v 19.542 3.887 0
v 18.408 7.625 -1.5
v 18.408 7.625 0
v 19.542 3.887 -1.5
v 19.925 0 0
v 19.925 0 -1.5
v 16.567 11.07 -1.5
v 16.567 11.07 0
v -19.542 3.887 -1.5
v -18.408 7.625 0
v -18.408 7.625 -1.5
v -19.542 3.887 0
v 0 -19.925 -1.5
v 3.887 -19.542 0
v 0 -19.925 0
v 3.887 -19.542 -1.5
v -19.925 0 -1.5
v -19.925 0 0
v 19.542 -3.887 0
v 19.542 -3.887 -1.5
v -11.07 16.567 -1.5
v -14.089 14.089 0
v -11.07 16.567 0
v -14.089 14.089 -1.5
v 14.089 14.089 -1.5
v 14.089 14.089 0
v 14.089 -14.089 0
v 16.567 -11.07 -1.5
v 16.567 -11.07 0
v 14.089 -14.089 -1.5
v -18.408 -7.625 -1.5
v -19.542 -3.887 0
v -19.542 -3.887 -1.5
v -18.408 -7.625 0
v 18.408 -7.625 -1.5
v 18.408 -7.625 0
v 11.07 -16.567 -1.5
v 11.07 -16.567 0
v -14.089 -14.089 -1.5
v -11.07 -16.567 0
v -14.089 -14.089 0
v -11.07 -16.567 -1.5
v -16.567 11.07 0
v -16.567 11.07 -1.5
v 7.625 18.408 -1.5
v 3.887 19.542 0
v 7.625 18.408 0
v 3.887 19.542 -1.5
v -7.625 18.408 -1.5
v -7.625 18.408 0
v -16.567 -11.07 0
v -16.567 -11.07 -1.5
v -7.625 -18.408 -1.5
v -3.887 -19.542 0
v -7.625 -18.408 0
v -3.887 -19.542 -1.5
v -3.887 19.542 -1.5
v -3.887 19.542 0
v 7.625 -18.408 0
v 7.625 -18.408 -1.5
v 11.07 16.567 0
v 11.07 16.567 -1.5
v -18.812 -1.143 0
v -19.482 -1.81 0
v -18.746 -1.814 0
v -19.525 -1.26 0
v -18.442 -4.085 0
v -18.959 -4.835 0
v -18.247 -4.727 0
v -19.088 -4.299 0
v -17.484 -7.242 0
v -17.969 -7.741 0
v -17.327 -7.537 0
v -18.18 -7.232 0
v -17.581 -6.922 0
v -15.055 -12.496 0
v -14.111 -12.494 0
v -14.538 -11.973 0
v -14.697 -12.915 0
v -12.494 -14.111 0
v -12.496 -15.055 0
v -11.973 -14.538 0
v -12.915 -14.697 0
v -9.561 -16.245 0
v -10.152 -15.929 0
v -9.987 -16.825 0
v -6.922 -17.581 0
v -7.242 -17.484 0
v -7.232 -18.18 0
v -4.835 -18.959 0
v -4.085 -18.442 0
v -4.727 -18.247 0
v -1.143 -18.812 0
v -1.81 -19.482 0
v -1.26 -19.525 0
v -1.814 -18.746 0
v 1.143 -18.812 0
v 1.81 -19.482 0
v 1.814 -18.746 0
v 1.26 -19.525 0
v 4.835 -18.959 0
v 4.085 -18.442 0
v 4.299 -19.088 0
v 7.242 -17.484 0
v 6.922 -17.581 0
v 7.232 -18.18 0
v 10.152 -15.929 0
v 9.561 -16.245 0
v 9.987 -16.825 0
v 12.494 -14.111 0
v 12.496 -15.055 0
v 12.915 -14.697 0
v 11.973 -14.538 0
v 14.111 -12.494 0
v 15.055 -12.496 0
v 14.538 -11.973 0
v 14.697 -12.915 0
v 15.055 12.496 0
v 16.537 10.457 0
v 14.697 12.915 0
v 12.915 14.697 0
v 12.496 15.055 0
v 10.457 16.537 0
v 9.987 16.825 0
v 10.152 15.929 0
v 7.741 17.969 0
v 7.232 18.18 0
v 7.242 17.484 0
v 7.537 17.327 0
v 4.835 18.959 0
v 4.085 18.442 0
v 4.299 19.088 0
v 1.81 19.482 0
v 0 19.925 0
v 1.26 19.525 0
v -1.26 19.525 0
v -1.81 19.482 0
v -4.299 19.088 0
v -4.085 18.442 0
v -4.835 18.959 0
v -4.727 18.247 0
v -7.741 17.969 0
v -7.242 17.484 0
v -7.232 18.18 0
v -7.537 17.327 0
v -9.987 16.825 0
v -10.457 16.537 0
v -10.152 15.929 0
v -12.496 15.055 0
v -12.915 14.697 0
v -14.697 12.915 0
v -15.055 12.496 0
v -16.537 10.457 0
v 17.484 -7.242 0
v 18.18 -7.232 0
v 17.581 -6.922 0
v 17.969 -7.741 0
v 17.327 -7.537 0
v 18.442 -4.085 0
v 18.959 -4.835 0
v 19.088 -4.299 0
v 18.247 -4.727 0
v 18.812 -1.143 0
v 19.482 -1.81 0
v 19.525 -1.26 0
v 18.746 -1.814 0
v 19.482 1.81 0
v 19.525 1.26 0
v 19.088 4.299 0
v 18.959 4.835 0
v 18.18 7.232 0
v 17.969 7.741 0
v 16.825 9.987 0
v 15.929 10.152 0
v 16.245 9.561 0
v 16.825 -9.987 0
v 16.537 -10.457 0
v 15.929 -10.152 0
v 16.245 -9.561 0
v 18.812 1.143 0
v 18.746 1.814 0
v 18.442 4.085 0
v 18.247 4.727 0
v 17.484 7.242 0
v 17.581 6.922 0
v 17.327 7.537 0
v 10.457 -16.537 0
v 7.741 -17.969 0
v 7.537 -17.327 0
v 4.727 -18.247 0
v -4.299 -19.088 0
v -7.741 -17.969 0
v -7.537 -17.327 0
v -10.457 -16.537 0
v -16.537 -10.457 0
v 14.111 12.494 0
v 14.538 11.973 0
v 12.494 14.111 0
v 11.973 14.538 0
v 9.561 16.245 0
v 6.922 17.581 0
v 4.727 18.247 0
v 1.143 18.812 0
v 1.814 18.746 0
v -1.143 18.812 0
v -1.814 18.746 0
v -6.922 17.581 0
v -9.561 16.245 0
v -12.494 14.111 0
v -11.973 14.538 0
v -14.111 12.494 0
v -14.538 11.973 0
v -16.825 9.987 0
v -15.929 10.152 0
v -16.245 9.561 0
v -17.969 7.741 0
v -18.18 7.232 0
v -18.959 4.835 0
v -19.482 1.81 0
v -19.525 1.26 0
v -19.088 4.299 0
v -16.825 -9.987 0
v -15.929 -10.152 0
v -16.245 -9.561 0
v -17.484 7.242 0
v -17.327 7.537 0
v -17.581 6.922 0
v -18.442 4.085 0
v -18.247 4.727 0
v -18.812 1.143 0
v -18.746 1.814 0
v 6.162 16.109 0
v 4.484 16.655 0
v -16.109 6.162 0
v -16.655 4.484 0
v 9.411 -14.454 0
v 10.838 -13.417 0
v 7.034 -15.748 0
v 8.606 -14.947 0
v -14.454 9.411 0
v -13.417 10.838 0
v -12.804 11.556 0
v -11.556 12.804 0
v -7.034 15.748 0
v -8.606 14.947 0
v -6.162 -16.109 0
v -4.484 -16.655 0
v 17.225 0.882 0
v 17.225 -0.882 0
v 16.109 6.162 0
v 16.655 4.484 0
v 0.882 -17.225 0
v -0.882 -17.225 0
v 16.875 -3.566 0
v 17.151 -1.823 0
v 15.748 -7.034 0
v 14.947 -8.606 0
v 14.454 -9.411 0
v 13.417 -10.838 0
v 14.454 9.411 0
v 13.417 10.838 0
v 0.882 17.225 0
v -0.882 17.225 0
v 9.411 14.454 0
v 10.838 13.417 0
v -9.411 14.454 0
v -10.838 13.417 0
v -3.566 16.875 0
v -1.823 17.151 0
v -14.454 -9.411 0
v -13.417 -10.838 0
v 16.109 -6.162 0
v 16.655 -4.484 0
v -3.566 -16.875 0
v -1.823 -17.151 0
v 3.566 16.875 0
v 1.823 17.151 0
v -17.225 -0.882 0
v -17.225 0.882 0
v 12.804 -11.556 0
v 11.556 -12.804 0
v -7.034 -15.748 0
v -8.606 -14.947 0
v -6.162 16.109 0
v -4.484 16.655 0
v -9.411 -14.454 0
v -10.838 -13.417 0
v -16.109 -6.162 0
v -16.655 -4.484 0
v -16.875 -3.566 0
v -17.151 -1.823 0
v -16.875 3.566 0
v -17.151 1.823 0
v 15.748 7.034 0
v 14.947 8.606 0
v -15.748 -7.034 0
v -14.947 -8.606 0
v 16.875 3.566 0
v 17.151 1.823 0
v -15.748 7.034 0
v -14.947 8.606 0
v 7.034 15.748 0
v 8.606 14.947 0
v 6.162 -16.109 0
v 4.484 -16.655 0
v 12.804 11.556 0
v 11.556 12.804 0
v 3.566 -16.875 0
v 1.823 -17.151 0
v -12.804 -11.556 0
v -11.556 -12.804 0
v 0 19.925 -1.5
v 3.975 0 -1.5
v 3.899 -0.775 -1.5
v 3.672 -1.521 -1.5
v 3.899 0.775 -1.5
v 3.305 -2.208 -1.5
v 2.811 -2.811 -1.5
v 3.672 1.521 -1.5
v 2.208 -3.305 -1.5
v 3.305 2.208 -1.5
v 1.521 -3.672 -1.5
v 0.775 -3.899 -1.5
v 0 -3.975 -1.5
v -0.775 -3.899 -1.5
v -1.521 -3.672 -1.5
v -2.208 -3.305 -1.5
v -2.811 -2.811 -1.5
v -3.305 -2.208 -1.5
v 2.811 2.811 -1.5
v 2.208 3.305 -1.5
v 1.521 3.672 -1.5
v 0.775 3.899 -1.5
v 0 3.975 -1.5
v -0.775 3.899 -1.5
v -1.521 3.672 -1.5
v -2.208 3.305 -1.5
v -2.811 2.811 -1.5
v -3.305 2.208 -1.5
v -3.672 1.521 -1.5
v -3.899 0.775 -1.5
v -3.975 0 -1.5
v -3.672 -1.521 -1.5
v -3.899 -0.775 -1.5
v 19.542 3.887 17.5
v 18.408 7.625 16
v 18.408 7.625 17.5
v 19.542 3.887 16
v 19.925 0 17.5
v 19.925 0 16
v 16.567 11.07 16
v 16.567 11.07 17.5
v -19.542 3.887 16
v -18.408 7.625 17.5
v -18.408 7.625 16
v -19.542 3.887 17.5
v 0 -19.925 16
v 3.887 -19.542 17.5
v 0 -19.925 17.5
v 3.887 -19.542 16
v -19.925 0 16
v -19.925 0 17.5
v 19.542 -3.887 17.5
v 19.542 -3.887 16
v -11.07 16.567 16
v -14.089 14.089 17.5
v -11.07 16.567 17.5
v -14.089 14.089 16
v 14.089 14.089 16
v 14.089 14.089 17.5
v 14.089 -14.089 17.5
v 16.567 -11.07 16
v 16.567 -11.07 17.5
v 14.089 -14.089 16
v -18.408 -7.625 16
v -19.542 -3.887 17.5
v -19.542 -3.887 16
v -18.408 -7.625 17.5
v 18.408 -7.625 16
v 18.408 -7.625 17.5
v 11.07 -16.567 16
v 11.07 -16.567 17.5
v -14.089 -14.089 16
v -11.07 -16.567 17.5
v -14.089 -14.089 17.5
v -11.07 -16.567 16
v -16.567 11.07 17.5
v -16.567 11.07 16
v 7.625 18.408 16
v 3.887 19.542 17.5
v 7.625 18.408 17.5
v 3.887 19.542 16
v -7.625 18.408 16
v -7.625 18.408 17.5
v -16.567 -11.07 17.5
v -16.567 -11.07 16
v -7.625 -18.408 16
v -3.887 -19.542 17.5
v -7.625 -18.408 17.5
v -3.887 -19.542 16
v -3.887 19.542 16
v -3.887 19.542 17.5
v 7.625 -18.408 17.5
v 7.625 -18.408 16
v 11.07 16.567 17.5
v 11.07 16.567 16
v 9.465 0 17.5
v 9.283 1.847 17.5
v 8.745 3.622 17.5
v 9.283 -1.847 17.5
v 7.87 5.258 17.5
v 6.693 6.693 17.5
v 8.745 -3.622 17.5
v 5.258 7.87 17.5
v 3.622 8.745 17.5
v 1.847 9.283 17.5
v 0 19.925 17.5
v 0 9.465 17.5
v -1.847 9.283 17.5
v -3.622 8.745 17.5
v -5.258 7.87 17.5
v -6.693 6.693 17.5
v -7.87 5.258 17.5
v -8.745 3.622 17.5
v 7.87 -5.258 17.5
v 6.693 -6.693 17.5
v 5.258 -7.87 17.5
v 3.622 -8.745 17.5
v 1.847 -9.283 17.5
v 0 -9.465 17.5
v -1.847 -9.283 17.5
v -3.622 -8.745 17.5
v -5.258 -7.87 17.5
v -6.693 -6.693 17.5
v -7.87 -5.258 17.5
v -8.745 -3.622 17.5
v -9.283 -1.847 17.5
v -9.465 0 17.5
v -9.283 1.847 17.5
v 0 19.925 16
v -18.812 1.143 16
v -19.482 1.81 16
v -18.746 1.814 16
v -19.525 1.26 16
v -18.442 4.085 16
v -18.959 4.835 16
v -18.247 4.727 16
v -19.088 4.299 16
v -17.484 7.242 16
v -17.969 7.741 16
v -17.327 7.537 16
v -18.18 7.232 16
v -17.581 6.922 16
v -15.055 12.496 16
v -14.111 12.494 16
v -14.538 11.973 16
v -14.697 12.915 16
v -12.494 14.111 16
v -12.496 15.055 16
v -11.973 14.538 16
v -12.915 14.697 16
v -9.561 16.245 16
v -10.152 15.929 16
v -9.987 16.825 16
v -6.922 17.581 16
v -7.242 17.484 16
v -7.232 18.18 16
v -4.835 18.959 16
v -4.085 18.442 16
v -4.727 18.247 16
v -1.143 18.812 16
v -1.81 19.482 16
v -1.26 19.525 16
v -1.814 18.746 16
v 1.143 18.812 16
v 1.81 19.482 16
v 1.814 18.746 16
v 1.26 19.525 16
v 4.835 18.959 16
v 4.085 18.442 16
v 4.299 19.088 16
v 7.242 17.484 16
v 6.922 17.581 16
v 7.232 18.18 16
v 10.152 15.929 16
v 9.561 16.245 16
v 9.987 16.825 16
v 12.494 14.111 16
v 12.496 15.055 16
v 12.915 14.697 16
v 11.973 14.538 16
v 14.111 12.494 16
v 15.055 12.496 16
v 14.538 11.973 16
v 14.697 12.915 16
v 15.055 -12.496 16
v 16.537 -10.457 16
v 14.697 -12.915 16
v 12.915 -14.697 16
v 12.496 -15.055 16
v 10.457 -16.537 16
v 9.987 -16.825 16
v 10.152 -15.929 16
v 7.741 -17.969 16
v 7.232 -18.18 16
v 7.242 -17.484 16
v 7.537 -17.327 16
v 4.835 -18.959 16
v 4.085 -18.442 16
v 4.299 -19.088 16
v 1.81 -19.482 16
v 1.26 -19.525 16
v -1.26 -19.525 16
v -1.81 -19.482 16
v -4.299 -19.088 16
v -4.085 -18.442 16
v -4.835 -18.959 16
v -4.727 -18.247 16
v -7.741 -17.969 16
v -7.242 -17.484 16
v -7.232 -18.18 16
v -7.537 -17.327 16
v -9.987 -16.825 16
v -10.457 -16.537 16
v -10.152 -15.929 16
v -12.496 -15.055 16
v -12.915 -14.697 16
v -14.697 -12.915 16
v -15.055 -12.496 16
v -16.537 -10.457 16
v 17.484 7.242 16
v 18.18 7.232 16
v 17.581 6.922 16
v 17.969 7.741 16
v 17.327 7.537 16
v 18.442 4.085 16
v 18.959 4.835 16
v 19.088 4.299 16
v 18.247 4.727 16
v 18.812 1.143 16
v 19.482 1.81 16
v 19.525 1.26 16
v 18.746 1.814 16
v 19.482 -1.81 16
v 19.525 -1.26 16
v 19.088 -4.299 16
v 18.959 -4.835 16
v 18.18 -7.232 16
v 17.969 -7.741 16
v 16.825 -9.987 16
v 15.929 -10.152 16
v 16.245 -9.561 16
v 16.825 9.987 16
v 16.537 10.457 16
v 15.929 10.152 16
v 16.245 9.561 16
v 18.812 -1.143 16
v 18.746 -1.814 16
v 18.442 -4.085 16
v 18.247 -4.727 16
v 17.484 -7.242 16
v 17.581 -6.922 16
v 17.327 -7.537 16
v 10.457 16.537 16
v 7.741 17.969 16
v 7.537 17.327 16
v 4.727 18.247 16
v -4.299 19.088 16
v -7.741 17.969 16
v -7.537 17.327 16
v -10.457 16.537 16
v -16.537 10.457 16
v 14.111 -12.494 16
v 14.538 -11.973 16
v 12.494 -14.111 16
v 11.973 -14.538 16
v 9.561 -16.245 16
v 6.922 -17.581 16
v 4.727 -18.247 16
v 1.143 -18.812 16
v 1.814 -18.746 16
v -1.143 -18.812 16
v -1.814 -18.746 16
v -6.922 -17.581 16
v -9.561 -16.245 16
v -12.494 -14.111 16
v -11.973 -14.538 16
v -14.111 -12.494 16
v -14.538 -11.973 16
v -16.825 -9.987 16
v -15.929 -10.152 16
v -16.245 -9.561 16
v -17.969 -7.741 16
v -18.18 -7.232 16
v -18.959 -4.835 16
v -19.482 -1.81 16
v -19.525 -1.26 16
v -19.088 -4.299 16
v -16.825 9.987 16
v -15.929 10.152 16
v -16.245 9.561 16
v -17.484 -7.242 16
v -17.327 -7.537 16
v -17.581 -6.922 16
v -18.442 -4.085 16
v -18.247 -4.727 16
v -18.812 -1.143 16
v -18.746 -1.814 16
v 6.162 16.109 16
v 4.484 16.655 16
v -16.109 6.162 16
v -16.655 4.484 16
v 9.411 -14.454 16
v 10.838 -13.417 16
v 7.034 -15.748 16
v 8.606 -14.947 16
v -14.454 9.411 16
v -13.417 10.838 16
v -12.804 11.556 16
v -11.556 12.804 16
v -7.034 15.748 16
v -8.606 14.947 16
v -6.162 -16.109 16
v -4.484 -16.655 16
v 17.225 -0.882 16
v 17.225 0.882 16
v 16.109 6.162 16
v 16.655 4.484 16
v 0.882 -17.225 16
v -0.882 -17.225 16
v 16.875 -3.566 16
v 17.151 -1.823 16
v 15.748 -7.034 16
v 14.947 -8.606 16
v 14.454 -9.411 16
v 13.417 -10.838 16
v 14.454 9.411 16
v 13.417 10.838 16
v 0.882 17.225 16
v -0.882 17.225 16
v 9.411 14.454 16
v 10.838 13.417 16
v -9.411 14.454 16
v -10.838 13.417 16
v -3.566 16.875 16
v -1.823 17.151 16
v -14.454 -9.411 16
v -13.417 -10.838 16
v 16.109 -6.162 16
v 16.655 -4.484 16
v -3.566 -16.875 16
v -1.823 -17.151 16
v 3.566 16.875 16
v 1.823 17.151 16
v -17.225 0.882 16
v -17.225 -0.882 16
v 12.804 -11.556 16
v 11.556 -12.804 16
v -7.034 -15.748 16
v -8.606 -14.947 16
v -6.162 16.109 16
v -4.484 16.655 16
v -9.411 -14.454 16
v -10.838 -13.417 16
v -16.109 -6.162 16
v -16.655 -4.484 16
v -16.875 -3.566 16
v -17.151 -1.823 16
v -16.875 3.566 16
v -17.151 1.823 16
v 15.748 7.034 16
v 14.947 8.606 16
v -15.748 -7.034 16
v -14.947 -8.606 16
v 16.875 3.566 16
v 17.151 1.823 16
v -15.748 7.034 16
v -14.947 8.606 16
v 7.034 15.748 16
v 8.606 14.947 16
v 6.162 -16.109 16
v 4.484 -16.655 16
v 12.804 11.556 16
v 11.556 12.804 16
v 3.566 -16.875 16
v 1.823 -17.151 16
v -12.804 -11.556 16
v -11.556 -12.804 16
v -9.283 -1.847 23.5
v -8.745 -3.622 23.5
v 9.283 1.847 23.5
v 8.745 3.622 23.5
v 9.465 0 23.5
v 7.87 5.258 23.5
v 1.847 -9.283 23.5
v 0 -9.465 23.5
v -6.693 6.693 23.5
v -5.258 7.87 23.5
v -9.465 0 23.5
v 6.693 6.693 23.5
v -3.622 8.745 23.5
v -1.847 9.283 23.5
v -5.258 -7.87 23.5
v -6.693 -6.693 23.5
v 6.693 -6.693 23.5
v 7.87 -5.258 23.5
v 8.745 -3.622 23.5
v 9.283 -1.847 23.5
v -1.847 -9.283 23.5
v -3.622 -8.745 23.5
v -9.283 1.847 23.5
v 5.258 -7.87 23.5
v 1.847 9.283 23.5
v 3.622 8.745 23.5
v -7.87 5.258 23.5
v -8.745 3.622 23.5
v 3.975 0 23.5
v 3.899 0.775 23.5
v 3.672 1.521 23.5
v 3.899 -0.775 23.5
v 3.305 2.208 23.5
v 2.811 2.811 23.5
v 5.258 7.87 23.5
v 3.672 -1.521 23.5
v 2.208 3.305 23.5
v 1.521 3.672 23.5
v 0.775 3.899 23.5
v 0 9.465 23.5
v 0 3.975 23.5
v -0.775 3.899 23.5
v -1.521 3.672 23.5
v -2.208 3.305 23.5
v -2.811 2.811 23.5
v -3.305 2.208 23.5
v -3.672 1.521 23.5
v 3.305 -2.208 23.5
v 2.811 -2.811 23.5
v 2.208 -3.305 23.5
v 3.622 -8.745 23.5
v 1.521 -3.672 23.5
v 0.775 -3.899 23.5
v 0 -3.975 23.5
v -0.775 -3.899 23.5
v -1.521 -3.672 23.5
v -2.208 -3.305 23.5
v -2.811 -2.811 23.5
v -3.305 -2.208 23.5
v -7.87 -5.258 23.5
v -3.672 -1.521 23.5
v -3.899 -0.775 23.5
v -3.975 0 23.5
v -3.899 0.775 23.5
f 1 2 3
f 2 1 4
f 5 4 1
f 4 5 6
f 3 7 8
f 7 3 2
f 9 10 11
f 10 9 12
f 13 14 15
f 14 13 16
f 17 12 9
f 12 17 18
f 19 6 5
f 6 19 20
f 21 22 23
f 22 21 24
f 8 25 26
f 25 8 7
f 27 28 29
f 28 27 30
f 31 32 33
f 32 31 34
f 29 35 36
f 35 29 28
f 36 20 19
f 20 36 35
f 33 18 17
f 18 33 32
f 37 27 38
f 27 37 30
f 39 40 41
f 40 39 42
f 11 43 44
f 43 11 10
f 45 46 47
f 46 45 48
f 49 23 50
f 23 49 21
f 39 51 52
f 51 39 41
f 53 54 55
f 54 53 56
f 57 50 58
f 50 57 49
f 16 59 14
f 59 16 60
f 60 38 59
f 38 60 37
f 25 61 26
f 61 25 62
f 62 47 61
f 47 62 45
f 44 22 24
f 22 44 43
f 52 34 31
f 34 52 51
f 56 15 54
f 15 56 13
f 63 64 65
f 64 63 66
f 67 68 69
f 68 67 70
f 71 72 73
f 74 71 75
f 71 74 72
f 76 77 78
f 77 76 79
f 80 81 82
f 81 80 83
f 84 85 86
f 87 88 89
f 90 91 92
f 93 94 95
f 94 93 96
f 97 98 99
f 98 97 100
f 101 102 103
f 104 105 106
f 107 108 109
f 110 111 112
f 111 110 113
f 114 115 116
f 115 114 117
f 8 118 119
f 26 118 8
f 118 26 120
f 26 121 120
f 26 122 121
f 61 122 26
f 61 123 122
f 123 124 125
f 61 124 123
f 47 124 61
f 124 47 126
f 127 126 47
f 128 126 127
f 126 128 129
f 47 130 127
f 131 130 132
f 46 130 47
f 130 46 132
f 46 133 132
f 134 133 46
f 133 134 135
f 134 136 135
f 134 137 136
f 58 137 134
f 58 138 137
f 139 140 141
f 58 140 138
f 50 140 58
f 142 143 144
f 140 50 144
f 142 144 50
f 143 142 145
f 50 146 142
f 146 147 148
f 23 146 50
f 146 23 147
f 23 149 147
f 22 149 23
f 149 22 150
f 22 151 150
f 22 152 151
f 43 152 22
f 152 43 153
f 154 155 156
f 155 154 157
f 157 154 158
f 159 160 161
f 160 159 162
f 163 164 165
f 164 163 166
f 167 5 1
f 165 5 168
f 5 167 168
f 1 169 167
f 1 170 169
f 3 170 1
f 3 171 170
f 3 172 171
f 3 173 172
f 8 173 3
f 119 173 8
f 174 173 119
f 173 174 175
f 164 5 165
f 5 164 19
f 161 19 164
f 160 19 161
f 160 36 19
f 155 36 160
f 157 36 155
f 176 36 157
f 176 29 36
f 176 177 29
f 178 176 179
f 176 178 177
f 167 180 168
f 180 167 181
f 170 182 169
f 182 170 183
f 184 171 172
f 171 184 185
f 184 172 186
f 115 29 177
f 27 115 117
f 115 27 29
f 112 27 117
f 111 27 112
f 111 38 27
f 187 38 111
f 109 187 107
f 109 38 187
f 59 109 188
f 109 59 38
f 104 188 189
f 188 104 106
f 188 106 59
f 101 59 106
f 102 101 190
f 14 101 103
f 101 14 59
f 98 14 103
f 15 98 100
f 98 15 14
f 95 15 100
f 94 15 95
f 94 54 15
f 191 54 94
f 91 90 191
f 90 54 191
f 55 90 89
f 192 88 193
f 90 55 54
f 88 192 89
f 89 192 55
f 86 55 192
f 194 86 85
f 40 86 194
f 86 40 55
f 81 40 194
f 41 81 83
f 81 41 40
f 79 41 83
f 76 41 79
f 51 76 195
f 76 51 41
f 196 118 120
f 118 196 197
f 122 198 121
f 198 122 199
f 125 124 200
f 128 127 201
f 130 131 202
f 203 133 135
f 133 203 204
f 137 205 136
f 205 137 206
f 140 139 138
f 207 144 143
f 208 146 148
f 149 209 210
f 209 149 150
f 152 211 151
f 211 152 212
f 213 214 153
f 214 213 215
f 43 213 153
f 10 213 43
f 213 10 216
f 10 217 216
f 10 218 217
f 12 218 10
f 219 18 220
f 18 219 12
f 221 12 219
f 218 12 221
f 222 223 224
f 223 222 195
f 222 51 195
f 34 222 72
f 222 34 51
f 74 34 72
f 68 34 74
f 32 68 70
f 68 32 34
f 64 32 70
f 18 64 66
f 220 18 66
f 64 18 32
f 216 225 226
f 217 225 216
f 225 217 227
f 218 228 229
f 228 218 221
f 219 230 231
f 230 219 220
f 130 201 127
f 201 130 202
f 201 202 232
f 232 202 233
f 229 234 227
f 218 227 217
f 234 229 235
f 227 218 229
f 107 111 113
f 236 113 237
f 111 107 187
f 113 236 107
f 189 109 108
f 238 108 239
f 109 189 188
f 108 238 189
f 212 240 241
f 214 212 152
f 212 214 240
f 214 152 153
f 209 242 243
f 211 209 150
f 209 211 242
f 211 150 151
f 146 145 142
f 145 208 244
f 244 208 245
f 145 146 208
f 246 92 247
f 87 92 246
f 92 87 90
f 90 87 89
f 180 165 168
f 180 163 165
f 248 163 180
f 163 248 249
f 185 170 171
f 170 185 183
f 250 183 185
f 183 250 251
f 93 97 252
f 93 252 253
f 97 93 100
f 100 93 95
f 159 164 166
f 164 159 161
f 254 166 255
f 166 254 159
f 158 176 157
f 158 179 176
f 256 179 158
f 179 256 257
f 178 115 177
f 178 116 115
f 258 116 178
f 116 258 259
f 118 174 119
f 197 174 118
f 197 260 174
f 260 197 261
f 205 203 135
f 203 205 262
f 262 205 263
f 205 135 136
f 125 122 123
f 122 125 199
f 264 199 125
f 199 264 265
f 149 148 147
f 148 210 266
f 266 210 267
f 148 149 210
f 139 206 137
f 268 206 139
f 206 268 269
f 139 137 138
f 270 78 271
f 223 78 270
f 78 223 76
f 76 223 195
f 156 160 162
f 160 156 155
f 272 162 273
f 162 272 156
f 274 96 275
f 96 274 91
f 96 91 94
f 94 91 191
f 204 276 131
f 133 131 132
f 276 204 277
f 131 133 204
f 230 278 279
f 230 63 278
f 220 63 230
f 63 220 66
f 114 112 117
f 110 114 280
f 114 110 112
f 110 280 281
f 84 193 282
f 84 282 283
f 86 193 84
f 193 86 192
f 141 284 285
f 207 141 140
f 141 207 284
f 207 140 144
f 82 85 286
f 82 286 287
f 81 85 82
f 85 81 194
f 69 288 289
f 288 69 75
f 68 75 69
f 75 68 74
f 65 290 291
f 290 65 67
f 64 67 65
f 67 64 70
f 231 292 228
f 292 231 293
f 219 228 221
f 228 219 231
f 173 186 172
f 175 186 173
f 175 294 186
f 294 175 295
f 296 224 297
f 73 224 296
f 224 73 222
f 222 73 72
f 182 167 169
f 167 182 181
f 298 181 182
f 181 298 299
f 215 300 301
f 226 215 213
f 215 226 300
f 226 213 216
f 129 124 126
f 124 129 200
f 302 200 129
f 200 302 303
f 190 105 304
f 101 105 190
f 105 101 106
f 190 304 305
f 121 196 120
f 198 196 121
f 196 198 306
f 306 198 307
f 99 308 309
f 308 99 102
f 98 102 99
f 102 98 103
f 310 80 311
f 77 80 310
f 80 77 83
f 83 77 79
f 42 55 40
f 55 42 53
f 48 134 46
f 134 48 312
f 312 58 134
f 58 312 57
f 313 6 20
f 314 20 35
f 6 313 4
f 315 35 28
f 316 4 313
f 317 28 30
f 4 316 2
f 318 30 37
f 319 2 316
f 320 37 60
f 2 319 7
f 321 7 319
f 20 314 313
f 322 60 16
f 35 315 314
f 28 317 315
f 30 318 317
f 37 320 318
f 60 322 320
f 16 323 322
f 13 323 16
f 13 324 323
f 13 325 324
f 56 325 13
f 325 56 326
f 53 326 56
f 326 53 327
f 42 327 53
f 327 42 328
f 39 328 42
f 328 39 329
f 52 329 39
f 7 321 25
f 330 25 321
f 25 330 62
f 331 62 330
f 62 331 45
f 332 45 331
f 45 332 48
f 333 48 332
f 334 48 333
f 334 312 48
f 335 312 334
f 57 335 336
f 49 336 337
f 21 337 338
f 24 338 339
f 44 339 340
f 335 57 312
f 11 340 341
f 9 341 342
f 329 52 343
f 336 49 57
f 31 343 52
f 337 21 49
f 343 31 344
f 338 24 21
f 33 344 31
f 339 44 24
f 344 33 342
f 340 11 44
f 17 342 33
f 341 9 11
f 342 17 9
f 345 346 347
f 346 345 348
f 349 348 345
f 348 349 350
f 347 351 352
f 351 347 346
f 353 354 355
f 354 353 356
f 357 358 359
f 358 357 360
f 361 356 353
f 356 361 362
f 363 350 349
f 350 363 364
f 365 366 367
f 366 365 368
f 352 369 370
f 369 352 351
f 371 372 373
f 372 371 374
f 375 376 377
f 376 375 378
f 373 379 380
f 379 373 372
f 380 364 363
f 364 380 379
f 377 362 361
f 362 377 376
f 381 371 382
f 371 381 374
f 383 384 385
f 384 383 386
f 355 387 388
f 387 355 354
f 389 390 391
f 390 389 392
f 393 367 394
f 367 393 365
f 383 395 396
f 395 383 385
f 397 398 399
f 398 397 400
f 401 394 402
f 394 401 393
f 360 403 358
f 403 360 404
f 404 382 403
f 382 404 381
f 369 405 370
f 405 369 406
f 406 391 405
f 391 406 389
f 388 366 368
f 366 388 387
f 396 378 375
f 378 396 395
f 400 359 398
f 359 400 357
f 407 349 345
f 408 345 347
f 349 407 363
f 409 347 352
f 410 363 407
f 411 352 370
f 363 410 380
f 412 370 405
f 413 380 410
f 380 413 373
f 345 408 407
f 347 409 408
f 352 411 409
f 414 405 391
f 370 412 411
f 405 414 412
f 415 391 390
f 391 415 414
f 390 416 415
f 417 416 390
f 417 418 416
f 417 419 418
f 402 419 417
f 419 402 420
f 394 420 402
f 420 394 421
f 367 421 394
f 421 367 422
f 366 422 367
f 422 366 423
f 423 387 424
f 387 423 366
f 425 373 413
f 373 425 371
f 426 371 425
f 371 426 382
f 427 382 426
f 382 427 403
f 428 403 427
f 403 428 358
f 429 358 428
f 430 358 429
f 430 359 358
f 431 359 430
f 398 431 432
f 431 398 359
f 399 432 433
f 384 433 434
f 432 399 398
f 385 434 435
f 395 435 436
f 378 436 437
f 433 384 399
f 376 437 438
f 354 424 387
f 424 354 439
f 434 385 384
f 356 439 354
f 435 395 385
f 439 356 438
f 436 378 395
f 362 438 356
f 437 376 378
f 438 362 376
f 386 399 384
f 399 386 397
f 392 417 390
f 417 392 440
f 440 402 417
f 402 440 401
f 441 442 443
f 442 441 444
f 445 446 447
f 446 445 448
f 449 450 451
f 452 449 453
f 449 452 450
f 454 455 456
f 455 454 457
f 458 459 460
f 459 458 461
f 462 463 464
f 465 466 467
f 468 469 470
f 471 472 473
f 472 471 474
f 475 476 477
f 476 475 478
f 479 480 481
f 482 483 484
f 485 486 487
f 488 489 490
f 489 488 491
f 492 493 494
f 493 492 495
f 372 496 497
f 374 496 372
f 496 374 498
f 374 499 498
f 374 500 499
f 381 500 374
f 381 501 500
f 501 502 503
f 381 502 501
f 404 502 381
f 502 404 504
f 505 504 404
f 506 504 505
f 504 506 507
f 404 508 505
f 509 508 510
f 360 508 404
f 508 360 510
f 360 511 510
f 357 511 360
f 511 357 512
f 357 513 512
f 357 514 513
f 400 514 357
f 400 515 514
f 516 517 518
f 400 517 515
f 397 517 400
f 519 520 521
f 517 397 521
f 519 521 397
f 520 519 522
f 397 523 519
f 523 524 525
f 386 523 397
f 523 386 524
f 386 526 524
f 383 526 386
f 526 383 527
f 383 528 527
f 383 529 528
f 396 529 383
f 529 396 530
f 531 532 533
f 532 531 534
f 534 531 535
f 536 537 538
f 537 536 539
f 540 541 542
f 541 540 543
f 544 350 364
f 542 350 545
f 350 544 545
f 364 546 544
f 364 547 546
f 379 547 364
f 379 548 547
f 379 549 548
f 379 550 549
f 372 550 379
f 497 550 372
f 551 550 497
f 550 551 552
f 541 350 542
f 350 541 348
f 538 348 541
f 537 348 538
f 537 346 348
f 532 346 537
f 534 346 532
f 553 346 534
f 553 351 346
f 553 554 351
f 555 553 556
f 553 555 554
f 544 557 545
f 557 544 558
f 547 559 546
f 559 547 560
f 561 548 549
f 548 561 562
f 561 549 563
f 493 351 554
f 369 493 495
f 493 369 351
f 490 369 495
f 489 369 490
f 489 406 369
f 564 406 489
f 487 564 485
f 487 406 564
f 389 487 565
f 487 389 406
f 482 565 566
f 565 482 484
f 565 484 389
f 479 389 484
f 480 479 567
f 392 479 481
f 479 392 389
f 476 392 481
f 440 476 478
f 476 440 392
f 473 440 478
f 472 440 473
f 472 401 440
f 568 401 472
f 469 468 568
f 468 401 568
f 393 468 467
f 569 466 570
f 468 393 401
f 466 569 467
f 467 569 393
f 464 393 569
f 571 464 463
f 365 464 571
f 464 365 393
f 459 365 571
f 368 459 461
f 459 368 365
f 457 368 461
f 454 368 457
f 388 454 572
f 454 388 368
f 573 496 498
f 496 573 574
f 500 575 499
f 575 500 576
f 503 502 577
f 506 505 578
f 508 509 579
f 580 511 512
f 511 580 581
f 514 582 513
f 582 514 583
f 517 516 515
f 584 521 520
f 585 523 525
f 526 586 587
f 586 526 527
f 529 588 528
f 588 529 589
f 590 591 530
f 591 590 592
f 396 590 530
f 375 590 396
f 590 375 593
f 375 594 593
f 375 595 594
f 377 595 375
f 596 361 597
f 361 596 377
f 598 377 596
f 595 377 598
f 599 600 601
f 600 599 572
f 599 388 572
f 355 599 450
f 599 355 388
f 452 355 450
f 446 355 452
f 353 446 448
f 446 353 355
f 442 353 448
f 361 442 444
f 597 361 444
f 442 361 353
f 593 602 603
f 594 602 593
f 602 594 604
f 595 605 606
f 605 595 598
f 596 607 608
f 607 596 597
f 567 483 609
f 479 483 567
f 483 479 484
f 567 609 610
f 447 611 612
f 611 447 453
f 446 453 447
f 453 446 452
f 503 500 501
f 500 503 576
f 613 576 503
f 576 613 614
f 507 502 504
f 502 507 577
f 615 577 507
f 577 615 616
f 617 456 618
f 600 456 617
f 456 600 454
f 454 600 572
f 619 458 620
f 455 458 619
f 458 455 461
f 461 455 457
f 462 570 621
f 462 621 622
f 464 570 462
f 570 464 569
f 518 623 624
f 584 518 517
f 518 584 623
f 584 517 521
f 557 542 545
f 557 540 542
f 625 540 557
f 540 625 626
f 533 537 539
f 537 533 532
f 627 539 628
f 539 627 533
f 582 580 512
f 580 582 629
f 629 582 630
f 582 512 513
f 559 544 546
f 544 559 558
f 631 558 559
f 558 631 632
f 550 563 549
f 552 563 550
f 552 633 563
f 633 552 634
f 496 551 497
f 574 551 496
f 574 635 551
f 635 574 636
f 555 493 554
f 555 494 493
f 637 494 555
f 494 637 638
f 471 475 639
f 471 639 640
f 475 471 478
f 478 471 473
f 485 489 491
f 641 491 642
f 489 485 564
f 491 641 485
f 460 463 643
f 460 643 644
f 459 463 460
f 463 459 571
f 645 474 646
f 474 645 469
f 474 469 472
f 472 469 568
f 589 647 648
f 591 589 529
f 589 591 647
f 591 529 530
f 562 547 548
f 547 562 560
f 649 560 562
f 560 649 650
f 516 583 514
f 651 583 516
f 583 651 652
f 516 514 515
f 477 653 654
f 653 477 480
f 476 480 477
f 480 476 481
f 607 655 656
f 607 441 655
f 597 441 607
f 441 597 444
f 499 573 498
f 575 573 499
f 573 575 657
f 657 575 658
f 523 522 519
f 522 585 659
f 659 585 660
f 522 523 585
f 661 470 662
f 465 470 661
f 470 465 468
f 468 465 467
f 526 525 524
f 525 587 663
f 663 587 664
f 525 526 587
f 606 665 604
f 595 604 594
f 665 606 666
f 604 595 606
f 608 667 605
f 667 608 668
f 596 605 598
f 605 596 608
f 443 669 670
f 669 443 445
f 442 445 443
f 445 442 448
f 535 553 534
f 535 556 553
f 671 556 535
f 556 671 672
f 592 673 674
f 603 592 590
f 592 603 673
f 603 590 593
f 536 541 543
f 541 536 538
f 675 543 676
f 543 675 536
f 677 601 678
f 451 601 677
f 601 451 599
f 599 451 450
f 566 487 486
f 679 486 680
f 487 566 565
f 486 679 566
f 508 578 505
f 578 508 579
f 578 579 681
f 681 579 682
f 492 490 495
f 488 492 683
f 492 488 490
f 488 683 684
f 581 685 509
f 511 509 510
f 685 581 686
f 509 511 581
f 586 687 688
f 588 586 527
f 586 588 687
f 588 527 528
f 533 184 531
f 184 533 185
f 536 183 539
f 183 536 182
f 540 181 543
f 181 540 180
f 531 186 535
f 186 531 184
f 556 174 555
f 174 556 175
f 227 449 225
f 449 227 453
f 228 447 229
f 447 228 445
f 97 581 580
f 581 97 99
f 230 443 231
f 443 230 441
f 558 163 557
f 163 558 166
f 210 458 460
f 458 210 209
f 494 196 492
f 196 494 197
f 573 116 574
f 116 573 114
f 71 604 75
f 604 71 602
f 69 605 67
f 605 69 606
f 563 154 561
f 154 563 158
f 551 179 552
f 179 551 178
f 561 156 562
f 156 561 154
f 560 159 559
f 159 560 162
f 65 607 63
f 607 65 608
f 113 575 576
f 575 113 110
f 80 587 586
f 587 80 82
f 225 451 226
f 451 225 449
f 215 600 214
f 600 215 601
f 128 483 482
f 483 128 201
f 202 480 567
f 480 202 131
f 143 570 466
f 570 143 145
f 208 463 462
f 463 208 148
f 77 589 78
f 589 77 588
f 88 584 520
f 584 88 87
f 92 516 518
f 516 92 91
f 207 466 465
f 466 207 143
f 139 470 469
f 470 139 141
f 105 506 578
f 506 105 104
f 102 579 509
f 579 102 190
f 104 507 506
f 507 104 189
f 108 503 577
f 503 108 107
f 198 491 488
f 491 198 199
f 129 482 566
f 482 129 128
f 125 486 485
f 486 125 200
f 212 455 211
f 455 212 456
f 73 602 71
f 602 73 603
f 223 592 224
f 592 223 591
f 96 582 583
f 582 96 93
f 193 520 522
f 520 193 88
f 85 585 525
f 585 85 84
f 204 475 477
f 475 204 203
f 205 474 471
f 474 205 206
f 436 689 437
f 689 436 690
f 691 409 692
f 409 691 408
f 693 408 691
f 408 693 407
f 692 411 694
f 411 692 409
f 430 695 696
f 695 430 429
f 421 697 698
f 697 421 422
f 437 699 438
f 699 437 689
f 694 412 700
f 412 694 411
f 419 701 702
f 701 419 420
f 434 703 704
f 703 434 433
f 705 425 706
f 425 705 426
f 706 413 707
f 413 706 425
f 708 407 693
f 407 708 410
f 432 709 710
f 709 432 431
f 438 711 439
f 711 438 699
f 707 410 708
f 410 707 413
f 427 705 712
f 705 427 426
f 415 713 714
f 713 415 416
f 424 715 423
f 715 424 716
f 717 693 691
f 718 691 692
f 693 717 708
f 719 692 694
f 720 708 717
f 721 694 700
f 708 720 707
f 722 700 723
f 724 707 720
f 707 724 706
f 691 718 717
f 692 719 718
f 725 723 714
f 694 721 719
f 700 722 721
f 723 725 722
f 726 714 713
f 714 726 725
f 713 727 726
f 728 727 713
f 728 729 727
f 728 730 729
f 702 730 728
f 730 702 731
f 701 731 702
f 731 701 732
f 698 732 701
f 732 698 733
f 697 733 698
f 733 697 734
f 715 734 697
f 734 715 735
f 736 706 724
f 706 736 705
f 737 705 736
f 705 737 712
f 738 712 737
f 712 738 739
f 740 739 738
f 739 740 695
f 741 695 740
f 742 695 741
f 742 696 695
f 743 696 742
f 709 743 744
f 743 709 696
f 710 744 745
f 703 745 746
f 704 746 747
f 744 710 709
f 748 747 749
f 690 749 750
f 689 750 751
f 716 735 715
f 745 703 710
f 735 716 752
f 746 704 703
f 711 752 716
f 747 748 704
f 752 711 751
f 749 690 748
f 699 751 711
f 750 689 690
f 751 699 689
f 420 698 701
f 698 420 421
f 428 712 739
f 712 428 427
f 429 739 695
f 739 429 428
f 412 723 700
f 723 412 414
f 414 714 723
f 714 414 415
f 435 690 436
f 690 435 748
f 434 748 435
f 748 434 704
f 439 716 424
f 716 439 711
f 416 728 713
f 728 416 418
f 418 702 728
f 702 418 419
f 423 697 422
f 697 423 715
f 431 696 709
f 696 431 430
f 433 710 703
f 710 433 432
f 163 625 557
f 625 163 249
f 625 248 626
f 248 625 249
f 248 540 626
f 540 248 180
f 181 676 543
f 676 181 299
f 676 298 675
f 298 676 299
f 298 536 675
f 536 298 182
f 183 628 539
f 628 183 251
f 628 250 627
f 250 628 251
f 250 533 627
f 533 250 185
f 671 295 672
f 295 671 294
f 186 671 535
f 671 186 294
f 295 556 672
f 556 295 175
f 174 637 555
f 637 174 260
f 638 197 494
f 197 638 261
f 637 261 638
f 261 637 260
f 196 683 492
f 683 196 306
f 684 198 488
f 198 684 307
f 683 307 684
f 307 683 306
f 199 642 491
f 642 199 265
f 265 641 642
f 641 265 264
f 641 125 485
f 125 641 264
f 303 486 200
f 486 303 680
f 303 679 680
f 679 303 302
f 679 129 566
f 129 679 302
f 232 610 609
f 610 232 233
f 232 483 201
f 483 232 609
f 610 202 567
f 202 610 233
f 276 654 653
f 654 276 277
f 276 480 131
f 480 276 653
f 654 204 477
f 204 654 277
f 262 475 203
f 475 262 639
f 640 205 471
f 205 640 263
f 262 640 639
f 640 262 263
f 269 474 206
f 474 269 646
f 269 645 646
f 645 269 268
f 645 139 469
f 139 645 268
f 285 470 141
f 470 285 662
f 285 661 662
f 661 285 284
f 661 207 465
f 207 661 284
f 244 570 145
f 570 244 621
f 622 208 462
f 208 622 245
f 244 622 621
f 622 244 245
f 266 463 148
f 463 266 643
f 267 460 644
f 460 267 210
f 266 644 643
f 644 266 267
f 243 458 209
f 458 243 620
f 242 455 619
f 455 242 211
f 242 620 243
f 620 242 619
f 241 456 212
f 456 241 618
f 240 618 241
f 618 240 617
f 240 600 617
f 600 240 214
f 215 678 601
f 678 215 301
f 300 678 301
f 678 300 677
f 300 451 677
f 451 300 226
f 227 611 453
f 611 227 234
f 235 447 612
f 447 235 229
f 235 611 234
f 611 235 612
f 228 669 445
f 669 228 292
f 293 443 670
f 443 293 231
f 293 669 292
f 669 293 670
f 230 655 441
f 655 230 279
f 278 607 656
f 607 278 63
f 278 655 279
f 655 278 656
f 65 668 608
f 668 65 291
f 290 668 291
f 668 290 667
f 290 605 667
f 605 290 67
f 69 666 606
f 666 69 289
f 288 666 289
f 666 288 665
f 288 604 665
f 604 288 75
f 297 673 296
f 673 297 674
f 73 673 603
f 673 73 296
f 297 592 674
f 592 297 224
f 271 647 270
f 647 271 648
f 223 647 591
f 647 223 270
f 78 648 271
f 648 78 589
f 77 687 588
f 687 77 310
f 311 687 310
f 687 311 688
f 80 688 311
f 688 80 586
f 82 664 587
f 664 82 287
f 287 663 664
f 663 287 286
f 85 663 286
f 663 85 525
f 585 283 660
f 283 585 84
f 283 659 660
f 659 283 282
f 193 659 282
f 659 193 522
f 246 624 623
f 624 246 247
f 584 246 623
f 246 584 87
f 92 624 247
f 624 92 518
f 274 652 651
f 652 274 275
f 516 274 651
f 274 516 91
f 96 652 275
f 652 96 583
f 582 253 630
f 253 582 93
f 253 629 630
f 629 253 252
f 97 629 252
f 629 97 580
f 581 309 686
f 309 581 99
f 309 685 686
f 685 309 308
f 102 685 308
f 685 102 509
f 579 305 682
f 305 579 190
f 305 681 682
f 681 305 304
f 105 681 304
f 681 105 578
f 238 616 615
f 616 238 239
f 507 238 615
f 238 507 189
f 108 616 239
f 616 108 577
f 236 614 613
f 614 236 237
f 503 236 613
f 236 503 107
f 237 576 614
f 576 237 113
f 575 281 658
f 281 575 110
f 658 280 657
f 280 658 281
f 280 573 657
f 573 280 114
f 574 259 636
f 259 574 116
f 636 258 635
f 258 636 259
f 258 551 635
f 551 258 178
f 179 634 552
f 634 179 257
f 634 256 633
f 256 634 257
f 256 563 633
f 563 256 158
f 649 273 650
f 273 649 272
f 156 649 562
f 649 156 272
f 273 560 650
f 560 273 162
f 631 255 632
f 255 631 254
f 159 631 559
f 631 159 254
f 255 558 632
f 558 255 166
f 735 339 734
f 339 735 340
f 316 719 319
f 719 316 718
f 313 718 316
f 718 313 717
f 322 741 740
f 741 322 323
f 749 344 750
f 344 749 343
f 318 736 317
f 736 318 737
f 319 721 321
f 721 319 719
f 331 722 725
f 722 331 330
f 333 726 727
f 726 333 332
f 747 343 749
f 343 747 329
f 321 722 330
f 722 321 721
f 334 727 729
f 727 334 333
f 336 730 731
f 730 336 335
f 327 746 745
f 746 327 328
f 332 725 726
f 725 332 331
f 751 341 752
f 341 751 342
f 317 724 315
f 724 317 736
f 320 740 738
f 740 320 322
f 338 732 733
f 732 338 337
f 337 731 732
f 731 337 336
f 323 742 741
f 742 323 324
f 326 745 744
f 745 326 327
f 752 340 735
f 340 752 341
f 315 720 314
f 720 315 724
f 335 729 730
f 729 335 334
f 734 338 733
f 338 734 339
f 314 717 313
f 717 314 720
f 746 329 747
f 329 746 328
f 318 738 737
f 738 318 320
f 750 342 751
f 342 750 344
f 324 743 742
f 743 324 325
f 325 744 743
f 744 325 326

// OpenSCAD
$fn = 32;

// ----------------------------------------------------------------------
// Timing pulley: GT3 40T, pitch 3 mm, 39.85 mm x 25 mm
// ----------------------------------------------------------------------

// --- parameters (mm) ---
belt_pitch = 3;           // belt pitch
n_teeth = 40;             // number of grooves
rim_w = 16;               // belt width between the flanges
tip_d = 37.85;            // tip circle diameter
root_d = 35.65;           // groove bottom diameter
groove_h = 1.1;           // groove depth
tooth_w = 2.1;            // groove width at the tip circle
rim_d = 39.85;            // flange diameter
rim_t = 1.5;              // flange thickness
spigot_d = 34.05;         // flange spigot, sunk into the rim
spigot_h = 1.2;           // spigot depth into the rim
shaft_d = 7.95;           // shaft bore
hub_d = 18.93;            // hub diameter
hub_h = 6;                // hub above the flange
bottom_z = -1.5;          // lowest point of the pulley
top_z = 23.5;             // highest point of the pulley

module rim() {
  cylinder(h = rim_w, d = tip_d);
}

module groove_cutter() {
  /* belt tooth groove: deeper than wide, cut through the belt width */
  translate([root_d / 2, 0, 0])
    linear_extrude(height = rim_w)
      polygon(points = [[-0.6, -tooth_w * 0.42], [groove_h + 0.6, -tooth_w * 0.6],
                        [groove_h + 0.6, tooth_w * 0.6], [-0.6, tooth_w * 0.42]]);
}

module flanges() {
  translate([0, 0, -rim_t]) cylinder(h = rim_t, d = rim_d);
  translate([0, 0, rim_w]) cylinder(h = rim_t, d = rim_d);
  translate([0, 0, -spigot_h]) cylinder(h = spigot_h + 0.6, d = spigot_d);
  translate([0, 0, rim_w - 0.6]) cylinder(h = spigot_h + 0.6, d = spigot_d);
}

module hub() {
  translate([0, 0, bottom_z]) cylinder(h = top_z - bottom_z, d = hub_d);
}

difference() {
  union() {
    rim();
    hub();
    flanges();
  }
  for (i = [0 : n_teeth - 1]) rotate([0, 0, i * 360 / n_teeth]) groove_cutter();
  translate([0, 0, bottom_z - 1]) cylinder(h = top_z - bottom_z + 2, d = shaft_d);
}
